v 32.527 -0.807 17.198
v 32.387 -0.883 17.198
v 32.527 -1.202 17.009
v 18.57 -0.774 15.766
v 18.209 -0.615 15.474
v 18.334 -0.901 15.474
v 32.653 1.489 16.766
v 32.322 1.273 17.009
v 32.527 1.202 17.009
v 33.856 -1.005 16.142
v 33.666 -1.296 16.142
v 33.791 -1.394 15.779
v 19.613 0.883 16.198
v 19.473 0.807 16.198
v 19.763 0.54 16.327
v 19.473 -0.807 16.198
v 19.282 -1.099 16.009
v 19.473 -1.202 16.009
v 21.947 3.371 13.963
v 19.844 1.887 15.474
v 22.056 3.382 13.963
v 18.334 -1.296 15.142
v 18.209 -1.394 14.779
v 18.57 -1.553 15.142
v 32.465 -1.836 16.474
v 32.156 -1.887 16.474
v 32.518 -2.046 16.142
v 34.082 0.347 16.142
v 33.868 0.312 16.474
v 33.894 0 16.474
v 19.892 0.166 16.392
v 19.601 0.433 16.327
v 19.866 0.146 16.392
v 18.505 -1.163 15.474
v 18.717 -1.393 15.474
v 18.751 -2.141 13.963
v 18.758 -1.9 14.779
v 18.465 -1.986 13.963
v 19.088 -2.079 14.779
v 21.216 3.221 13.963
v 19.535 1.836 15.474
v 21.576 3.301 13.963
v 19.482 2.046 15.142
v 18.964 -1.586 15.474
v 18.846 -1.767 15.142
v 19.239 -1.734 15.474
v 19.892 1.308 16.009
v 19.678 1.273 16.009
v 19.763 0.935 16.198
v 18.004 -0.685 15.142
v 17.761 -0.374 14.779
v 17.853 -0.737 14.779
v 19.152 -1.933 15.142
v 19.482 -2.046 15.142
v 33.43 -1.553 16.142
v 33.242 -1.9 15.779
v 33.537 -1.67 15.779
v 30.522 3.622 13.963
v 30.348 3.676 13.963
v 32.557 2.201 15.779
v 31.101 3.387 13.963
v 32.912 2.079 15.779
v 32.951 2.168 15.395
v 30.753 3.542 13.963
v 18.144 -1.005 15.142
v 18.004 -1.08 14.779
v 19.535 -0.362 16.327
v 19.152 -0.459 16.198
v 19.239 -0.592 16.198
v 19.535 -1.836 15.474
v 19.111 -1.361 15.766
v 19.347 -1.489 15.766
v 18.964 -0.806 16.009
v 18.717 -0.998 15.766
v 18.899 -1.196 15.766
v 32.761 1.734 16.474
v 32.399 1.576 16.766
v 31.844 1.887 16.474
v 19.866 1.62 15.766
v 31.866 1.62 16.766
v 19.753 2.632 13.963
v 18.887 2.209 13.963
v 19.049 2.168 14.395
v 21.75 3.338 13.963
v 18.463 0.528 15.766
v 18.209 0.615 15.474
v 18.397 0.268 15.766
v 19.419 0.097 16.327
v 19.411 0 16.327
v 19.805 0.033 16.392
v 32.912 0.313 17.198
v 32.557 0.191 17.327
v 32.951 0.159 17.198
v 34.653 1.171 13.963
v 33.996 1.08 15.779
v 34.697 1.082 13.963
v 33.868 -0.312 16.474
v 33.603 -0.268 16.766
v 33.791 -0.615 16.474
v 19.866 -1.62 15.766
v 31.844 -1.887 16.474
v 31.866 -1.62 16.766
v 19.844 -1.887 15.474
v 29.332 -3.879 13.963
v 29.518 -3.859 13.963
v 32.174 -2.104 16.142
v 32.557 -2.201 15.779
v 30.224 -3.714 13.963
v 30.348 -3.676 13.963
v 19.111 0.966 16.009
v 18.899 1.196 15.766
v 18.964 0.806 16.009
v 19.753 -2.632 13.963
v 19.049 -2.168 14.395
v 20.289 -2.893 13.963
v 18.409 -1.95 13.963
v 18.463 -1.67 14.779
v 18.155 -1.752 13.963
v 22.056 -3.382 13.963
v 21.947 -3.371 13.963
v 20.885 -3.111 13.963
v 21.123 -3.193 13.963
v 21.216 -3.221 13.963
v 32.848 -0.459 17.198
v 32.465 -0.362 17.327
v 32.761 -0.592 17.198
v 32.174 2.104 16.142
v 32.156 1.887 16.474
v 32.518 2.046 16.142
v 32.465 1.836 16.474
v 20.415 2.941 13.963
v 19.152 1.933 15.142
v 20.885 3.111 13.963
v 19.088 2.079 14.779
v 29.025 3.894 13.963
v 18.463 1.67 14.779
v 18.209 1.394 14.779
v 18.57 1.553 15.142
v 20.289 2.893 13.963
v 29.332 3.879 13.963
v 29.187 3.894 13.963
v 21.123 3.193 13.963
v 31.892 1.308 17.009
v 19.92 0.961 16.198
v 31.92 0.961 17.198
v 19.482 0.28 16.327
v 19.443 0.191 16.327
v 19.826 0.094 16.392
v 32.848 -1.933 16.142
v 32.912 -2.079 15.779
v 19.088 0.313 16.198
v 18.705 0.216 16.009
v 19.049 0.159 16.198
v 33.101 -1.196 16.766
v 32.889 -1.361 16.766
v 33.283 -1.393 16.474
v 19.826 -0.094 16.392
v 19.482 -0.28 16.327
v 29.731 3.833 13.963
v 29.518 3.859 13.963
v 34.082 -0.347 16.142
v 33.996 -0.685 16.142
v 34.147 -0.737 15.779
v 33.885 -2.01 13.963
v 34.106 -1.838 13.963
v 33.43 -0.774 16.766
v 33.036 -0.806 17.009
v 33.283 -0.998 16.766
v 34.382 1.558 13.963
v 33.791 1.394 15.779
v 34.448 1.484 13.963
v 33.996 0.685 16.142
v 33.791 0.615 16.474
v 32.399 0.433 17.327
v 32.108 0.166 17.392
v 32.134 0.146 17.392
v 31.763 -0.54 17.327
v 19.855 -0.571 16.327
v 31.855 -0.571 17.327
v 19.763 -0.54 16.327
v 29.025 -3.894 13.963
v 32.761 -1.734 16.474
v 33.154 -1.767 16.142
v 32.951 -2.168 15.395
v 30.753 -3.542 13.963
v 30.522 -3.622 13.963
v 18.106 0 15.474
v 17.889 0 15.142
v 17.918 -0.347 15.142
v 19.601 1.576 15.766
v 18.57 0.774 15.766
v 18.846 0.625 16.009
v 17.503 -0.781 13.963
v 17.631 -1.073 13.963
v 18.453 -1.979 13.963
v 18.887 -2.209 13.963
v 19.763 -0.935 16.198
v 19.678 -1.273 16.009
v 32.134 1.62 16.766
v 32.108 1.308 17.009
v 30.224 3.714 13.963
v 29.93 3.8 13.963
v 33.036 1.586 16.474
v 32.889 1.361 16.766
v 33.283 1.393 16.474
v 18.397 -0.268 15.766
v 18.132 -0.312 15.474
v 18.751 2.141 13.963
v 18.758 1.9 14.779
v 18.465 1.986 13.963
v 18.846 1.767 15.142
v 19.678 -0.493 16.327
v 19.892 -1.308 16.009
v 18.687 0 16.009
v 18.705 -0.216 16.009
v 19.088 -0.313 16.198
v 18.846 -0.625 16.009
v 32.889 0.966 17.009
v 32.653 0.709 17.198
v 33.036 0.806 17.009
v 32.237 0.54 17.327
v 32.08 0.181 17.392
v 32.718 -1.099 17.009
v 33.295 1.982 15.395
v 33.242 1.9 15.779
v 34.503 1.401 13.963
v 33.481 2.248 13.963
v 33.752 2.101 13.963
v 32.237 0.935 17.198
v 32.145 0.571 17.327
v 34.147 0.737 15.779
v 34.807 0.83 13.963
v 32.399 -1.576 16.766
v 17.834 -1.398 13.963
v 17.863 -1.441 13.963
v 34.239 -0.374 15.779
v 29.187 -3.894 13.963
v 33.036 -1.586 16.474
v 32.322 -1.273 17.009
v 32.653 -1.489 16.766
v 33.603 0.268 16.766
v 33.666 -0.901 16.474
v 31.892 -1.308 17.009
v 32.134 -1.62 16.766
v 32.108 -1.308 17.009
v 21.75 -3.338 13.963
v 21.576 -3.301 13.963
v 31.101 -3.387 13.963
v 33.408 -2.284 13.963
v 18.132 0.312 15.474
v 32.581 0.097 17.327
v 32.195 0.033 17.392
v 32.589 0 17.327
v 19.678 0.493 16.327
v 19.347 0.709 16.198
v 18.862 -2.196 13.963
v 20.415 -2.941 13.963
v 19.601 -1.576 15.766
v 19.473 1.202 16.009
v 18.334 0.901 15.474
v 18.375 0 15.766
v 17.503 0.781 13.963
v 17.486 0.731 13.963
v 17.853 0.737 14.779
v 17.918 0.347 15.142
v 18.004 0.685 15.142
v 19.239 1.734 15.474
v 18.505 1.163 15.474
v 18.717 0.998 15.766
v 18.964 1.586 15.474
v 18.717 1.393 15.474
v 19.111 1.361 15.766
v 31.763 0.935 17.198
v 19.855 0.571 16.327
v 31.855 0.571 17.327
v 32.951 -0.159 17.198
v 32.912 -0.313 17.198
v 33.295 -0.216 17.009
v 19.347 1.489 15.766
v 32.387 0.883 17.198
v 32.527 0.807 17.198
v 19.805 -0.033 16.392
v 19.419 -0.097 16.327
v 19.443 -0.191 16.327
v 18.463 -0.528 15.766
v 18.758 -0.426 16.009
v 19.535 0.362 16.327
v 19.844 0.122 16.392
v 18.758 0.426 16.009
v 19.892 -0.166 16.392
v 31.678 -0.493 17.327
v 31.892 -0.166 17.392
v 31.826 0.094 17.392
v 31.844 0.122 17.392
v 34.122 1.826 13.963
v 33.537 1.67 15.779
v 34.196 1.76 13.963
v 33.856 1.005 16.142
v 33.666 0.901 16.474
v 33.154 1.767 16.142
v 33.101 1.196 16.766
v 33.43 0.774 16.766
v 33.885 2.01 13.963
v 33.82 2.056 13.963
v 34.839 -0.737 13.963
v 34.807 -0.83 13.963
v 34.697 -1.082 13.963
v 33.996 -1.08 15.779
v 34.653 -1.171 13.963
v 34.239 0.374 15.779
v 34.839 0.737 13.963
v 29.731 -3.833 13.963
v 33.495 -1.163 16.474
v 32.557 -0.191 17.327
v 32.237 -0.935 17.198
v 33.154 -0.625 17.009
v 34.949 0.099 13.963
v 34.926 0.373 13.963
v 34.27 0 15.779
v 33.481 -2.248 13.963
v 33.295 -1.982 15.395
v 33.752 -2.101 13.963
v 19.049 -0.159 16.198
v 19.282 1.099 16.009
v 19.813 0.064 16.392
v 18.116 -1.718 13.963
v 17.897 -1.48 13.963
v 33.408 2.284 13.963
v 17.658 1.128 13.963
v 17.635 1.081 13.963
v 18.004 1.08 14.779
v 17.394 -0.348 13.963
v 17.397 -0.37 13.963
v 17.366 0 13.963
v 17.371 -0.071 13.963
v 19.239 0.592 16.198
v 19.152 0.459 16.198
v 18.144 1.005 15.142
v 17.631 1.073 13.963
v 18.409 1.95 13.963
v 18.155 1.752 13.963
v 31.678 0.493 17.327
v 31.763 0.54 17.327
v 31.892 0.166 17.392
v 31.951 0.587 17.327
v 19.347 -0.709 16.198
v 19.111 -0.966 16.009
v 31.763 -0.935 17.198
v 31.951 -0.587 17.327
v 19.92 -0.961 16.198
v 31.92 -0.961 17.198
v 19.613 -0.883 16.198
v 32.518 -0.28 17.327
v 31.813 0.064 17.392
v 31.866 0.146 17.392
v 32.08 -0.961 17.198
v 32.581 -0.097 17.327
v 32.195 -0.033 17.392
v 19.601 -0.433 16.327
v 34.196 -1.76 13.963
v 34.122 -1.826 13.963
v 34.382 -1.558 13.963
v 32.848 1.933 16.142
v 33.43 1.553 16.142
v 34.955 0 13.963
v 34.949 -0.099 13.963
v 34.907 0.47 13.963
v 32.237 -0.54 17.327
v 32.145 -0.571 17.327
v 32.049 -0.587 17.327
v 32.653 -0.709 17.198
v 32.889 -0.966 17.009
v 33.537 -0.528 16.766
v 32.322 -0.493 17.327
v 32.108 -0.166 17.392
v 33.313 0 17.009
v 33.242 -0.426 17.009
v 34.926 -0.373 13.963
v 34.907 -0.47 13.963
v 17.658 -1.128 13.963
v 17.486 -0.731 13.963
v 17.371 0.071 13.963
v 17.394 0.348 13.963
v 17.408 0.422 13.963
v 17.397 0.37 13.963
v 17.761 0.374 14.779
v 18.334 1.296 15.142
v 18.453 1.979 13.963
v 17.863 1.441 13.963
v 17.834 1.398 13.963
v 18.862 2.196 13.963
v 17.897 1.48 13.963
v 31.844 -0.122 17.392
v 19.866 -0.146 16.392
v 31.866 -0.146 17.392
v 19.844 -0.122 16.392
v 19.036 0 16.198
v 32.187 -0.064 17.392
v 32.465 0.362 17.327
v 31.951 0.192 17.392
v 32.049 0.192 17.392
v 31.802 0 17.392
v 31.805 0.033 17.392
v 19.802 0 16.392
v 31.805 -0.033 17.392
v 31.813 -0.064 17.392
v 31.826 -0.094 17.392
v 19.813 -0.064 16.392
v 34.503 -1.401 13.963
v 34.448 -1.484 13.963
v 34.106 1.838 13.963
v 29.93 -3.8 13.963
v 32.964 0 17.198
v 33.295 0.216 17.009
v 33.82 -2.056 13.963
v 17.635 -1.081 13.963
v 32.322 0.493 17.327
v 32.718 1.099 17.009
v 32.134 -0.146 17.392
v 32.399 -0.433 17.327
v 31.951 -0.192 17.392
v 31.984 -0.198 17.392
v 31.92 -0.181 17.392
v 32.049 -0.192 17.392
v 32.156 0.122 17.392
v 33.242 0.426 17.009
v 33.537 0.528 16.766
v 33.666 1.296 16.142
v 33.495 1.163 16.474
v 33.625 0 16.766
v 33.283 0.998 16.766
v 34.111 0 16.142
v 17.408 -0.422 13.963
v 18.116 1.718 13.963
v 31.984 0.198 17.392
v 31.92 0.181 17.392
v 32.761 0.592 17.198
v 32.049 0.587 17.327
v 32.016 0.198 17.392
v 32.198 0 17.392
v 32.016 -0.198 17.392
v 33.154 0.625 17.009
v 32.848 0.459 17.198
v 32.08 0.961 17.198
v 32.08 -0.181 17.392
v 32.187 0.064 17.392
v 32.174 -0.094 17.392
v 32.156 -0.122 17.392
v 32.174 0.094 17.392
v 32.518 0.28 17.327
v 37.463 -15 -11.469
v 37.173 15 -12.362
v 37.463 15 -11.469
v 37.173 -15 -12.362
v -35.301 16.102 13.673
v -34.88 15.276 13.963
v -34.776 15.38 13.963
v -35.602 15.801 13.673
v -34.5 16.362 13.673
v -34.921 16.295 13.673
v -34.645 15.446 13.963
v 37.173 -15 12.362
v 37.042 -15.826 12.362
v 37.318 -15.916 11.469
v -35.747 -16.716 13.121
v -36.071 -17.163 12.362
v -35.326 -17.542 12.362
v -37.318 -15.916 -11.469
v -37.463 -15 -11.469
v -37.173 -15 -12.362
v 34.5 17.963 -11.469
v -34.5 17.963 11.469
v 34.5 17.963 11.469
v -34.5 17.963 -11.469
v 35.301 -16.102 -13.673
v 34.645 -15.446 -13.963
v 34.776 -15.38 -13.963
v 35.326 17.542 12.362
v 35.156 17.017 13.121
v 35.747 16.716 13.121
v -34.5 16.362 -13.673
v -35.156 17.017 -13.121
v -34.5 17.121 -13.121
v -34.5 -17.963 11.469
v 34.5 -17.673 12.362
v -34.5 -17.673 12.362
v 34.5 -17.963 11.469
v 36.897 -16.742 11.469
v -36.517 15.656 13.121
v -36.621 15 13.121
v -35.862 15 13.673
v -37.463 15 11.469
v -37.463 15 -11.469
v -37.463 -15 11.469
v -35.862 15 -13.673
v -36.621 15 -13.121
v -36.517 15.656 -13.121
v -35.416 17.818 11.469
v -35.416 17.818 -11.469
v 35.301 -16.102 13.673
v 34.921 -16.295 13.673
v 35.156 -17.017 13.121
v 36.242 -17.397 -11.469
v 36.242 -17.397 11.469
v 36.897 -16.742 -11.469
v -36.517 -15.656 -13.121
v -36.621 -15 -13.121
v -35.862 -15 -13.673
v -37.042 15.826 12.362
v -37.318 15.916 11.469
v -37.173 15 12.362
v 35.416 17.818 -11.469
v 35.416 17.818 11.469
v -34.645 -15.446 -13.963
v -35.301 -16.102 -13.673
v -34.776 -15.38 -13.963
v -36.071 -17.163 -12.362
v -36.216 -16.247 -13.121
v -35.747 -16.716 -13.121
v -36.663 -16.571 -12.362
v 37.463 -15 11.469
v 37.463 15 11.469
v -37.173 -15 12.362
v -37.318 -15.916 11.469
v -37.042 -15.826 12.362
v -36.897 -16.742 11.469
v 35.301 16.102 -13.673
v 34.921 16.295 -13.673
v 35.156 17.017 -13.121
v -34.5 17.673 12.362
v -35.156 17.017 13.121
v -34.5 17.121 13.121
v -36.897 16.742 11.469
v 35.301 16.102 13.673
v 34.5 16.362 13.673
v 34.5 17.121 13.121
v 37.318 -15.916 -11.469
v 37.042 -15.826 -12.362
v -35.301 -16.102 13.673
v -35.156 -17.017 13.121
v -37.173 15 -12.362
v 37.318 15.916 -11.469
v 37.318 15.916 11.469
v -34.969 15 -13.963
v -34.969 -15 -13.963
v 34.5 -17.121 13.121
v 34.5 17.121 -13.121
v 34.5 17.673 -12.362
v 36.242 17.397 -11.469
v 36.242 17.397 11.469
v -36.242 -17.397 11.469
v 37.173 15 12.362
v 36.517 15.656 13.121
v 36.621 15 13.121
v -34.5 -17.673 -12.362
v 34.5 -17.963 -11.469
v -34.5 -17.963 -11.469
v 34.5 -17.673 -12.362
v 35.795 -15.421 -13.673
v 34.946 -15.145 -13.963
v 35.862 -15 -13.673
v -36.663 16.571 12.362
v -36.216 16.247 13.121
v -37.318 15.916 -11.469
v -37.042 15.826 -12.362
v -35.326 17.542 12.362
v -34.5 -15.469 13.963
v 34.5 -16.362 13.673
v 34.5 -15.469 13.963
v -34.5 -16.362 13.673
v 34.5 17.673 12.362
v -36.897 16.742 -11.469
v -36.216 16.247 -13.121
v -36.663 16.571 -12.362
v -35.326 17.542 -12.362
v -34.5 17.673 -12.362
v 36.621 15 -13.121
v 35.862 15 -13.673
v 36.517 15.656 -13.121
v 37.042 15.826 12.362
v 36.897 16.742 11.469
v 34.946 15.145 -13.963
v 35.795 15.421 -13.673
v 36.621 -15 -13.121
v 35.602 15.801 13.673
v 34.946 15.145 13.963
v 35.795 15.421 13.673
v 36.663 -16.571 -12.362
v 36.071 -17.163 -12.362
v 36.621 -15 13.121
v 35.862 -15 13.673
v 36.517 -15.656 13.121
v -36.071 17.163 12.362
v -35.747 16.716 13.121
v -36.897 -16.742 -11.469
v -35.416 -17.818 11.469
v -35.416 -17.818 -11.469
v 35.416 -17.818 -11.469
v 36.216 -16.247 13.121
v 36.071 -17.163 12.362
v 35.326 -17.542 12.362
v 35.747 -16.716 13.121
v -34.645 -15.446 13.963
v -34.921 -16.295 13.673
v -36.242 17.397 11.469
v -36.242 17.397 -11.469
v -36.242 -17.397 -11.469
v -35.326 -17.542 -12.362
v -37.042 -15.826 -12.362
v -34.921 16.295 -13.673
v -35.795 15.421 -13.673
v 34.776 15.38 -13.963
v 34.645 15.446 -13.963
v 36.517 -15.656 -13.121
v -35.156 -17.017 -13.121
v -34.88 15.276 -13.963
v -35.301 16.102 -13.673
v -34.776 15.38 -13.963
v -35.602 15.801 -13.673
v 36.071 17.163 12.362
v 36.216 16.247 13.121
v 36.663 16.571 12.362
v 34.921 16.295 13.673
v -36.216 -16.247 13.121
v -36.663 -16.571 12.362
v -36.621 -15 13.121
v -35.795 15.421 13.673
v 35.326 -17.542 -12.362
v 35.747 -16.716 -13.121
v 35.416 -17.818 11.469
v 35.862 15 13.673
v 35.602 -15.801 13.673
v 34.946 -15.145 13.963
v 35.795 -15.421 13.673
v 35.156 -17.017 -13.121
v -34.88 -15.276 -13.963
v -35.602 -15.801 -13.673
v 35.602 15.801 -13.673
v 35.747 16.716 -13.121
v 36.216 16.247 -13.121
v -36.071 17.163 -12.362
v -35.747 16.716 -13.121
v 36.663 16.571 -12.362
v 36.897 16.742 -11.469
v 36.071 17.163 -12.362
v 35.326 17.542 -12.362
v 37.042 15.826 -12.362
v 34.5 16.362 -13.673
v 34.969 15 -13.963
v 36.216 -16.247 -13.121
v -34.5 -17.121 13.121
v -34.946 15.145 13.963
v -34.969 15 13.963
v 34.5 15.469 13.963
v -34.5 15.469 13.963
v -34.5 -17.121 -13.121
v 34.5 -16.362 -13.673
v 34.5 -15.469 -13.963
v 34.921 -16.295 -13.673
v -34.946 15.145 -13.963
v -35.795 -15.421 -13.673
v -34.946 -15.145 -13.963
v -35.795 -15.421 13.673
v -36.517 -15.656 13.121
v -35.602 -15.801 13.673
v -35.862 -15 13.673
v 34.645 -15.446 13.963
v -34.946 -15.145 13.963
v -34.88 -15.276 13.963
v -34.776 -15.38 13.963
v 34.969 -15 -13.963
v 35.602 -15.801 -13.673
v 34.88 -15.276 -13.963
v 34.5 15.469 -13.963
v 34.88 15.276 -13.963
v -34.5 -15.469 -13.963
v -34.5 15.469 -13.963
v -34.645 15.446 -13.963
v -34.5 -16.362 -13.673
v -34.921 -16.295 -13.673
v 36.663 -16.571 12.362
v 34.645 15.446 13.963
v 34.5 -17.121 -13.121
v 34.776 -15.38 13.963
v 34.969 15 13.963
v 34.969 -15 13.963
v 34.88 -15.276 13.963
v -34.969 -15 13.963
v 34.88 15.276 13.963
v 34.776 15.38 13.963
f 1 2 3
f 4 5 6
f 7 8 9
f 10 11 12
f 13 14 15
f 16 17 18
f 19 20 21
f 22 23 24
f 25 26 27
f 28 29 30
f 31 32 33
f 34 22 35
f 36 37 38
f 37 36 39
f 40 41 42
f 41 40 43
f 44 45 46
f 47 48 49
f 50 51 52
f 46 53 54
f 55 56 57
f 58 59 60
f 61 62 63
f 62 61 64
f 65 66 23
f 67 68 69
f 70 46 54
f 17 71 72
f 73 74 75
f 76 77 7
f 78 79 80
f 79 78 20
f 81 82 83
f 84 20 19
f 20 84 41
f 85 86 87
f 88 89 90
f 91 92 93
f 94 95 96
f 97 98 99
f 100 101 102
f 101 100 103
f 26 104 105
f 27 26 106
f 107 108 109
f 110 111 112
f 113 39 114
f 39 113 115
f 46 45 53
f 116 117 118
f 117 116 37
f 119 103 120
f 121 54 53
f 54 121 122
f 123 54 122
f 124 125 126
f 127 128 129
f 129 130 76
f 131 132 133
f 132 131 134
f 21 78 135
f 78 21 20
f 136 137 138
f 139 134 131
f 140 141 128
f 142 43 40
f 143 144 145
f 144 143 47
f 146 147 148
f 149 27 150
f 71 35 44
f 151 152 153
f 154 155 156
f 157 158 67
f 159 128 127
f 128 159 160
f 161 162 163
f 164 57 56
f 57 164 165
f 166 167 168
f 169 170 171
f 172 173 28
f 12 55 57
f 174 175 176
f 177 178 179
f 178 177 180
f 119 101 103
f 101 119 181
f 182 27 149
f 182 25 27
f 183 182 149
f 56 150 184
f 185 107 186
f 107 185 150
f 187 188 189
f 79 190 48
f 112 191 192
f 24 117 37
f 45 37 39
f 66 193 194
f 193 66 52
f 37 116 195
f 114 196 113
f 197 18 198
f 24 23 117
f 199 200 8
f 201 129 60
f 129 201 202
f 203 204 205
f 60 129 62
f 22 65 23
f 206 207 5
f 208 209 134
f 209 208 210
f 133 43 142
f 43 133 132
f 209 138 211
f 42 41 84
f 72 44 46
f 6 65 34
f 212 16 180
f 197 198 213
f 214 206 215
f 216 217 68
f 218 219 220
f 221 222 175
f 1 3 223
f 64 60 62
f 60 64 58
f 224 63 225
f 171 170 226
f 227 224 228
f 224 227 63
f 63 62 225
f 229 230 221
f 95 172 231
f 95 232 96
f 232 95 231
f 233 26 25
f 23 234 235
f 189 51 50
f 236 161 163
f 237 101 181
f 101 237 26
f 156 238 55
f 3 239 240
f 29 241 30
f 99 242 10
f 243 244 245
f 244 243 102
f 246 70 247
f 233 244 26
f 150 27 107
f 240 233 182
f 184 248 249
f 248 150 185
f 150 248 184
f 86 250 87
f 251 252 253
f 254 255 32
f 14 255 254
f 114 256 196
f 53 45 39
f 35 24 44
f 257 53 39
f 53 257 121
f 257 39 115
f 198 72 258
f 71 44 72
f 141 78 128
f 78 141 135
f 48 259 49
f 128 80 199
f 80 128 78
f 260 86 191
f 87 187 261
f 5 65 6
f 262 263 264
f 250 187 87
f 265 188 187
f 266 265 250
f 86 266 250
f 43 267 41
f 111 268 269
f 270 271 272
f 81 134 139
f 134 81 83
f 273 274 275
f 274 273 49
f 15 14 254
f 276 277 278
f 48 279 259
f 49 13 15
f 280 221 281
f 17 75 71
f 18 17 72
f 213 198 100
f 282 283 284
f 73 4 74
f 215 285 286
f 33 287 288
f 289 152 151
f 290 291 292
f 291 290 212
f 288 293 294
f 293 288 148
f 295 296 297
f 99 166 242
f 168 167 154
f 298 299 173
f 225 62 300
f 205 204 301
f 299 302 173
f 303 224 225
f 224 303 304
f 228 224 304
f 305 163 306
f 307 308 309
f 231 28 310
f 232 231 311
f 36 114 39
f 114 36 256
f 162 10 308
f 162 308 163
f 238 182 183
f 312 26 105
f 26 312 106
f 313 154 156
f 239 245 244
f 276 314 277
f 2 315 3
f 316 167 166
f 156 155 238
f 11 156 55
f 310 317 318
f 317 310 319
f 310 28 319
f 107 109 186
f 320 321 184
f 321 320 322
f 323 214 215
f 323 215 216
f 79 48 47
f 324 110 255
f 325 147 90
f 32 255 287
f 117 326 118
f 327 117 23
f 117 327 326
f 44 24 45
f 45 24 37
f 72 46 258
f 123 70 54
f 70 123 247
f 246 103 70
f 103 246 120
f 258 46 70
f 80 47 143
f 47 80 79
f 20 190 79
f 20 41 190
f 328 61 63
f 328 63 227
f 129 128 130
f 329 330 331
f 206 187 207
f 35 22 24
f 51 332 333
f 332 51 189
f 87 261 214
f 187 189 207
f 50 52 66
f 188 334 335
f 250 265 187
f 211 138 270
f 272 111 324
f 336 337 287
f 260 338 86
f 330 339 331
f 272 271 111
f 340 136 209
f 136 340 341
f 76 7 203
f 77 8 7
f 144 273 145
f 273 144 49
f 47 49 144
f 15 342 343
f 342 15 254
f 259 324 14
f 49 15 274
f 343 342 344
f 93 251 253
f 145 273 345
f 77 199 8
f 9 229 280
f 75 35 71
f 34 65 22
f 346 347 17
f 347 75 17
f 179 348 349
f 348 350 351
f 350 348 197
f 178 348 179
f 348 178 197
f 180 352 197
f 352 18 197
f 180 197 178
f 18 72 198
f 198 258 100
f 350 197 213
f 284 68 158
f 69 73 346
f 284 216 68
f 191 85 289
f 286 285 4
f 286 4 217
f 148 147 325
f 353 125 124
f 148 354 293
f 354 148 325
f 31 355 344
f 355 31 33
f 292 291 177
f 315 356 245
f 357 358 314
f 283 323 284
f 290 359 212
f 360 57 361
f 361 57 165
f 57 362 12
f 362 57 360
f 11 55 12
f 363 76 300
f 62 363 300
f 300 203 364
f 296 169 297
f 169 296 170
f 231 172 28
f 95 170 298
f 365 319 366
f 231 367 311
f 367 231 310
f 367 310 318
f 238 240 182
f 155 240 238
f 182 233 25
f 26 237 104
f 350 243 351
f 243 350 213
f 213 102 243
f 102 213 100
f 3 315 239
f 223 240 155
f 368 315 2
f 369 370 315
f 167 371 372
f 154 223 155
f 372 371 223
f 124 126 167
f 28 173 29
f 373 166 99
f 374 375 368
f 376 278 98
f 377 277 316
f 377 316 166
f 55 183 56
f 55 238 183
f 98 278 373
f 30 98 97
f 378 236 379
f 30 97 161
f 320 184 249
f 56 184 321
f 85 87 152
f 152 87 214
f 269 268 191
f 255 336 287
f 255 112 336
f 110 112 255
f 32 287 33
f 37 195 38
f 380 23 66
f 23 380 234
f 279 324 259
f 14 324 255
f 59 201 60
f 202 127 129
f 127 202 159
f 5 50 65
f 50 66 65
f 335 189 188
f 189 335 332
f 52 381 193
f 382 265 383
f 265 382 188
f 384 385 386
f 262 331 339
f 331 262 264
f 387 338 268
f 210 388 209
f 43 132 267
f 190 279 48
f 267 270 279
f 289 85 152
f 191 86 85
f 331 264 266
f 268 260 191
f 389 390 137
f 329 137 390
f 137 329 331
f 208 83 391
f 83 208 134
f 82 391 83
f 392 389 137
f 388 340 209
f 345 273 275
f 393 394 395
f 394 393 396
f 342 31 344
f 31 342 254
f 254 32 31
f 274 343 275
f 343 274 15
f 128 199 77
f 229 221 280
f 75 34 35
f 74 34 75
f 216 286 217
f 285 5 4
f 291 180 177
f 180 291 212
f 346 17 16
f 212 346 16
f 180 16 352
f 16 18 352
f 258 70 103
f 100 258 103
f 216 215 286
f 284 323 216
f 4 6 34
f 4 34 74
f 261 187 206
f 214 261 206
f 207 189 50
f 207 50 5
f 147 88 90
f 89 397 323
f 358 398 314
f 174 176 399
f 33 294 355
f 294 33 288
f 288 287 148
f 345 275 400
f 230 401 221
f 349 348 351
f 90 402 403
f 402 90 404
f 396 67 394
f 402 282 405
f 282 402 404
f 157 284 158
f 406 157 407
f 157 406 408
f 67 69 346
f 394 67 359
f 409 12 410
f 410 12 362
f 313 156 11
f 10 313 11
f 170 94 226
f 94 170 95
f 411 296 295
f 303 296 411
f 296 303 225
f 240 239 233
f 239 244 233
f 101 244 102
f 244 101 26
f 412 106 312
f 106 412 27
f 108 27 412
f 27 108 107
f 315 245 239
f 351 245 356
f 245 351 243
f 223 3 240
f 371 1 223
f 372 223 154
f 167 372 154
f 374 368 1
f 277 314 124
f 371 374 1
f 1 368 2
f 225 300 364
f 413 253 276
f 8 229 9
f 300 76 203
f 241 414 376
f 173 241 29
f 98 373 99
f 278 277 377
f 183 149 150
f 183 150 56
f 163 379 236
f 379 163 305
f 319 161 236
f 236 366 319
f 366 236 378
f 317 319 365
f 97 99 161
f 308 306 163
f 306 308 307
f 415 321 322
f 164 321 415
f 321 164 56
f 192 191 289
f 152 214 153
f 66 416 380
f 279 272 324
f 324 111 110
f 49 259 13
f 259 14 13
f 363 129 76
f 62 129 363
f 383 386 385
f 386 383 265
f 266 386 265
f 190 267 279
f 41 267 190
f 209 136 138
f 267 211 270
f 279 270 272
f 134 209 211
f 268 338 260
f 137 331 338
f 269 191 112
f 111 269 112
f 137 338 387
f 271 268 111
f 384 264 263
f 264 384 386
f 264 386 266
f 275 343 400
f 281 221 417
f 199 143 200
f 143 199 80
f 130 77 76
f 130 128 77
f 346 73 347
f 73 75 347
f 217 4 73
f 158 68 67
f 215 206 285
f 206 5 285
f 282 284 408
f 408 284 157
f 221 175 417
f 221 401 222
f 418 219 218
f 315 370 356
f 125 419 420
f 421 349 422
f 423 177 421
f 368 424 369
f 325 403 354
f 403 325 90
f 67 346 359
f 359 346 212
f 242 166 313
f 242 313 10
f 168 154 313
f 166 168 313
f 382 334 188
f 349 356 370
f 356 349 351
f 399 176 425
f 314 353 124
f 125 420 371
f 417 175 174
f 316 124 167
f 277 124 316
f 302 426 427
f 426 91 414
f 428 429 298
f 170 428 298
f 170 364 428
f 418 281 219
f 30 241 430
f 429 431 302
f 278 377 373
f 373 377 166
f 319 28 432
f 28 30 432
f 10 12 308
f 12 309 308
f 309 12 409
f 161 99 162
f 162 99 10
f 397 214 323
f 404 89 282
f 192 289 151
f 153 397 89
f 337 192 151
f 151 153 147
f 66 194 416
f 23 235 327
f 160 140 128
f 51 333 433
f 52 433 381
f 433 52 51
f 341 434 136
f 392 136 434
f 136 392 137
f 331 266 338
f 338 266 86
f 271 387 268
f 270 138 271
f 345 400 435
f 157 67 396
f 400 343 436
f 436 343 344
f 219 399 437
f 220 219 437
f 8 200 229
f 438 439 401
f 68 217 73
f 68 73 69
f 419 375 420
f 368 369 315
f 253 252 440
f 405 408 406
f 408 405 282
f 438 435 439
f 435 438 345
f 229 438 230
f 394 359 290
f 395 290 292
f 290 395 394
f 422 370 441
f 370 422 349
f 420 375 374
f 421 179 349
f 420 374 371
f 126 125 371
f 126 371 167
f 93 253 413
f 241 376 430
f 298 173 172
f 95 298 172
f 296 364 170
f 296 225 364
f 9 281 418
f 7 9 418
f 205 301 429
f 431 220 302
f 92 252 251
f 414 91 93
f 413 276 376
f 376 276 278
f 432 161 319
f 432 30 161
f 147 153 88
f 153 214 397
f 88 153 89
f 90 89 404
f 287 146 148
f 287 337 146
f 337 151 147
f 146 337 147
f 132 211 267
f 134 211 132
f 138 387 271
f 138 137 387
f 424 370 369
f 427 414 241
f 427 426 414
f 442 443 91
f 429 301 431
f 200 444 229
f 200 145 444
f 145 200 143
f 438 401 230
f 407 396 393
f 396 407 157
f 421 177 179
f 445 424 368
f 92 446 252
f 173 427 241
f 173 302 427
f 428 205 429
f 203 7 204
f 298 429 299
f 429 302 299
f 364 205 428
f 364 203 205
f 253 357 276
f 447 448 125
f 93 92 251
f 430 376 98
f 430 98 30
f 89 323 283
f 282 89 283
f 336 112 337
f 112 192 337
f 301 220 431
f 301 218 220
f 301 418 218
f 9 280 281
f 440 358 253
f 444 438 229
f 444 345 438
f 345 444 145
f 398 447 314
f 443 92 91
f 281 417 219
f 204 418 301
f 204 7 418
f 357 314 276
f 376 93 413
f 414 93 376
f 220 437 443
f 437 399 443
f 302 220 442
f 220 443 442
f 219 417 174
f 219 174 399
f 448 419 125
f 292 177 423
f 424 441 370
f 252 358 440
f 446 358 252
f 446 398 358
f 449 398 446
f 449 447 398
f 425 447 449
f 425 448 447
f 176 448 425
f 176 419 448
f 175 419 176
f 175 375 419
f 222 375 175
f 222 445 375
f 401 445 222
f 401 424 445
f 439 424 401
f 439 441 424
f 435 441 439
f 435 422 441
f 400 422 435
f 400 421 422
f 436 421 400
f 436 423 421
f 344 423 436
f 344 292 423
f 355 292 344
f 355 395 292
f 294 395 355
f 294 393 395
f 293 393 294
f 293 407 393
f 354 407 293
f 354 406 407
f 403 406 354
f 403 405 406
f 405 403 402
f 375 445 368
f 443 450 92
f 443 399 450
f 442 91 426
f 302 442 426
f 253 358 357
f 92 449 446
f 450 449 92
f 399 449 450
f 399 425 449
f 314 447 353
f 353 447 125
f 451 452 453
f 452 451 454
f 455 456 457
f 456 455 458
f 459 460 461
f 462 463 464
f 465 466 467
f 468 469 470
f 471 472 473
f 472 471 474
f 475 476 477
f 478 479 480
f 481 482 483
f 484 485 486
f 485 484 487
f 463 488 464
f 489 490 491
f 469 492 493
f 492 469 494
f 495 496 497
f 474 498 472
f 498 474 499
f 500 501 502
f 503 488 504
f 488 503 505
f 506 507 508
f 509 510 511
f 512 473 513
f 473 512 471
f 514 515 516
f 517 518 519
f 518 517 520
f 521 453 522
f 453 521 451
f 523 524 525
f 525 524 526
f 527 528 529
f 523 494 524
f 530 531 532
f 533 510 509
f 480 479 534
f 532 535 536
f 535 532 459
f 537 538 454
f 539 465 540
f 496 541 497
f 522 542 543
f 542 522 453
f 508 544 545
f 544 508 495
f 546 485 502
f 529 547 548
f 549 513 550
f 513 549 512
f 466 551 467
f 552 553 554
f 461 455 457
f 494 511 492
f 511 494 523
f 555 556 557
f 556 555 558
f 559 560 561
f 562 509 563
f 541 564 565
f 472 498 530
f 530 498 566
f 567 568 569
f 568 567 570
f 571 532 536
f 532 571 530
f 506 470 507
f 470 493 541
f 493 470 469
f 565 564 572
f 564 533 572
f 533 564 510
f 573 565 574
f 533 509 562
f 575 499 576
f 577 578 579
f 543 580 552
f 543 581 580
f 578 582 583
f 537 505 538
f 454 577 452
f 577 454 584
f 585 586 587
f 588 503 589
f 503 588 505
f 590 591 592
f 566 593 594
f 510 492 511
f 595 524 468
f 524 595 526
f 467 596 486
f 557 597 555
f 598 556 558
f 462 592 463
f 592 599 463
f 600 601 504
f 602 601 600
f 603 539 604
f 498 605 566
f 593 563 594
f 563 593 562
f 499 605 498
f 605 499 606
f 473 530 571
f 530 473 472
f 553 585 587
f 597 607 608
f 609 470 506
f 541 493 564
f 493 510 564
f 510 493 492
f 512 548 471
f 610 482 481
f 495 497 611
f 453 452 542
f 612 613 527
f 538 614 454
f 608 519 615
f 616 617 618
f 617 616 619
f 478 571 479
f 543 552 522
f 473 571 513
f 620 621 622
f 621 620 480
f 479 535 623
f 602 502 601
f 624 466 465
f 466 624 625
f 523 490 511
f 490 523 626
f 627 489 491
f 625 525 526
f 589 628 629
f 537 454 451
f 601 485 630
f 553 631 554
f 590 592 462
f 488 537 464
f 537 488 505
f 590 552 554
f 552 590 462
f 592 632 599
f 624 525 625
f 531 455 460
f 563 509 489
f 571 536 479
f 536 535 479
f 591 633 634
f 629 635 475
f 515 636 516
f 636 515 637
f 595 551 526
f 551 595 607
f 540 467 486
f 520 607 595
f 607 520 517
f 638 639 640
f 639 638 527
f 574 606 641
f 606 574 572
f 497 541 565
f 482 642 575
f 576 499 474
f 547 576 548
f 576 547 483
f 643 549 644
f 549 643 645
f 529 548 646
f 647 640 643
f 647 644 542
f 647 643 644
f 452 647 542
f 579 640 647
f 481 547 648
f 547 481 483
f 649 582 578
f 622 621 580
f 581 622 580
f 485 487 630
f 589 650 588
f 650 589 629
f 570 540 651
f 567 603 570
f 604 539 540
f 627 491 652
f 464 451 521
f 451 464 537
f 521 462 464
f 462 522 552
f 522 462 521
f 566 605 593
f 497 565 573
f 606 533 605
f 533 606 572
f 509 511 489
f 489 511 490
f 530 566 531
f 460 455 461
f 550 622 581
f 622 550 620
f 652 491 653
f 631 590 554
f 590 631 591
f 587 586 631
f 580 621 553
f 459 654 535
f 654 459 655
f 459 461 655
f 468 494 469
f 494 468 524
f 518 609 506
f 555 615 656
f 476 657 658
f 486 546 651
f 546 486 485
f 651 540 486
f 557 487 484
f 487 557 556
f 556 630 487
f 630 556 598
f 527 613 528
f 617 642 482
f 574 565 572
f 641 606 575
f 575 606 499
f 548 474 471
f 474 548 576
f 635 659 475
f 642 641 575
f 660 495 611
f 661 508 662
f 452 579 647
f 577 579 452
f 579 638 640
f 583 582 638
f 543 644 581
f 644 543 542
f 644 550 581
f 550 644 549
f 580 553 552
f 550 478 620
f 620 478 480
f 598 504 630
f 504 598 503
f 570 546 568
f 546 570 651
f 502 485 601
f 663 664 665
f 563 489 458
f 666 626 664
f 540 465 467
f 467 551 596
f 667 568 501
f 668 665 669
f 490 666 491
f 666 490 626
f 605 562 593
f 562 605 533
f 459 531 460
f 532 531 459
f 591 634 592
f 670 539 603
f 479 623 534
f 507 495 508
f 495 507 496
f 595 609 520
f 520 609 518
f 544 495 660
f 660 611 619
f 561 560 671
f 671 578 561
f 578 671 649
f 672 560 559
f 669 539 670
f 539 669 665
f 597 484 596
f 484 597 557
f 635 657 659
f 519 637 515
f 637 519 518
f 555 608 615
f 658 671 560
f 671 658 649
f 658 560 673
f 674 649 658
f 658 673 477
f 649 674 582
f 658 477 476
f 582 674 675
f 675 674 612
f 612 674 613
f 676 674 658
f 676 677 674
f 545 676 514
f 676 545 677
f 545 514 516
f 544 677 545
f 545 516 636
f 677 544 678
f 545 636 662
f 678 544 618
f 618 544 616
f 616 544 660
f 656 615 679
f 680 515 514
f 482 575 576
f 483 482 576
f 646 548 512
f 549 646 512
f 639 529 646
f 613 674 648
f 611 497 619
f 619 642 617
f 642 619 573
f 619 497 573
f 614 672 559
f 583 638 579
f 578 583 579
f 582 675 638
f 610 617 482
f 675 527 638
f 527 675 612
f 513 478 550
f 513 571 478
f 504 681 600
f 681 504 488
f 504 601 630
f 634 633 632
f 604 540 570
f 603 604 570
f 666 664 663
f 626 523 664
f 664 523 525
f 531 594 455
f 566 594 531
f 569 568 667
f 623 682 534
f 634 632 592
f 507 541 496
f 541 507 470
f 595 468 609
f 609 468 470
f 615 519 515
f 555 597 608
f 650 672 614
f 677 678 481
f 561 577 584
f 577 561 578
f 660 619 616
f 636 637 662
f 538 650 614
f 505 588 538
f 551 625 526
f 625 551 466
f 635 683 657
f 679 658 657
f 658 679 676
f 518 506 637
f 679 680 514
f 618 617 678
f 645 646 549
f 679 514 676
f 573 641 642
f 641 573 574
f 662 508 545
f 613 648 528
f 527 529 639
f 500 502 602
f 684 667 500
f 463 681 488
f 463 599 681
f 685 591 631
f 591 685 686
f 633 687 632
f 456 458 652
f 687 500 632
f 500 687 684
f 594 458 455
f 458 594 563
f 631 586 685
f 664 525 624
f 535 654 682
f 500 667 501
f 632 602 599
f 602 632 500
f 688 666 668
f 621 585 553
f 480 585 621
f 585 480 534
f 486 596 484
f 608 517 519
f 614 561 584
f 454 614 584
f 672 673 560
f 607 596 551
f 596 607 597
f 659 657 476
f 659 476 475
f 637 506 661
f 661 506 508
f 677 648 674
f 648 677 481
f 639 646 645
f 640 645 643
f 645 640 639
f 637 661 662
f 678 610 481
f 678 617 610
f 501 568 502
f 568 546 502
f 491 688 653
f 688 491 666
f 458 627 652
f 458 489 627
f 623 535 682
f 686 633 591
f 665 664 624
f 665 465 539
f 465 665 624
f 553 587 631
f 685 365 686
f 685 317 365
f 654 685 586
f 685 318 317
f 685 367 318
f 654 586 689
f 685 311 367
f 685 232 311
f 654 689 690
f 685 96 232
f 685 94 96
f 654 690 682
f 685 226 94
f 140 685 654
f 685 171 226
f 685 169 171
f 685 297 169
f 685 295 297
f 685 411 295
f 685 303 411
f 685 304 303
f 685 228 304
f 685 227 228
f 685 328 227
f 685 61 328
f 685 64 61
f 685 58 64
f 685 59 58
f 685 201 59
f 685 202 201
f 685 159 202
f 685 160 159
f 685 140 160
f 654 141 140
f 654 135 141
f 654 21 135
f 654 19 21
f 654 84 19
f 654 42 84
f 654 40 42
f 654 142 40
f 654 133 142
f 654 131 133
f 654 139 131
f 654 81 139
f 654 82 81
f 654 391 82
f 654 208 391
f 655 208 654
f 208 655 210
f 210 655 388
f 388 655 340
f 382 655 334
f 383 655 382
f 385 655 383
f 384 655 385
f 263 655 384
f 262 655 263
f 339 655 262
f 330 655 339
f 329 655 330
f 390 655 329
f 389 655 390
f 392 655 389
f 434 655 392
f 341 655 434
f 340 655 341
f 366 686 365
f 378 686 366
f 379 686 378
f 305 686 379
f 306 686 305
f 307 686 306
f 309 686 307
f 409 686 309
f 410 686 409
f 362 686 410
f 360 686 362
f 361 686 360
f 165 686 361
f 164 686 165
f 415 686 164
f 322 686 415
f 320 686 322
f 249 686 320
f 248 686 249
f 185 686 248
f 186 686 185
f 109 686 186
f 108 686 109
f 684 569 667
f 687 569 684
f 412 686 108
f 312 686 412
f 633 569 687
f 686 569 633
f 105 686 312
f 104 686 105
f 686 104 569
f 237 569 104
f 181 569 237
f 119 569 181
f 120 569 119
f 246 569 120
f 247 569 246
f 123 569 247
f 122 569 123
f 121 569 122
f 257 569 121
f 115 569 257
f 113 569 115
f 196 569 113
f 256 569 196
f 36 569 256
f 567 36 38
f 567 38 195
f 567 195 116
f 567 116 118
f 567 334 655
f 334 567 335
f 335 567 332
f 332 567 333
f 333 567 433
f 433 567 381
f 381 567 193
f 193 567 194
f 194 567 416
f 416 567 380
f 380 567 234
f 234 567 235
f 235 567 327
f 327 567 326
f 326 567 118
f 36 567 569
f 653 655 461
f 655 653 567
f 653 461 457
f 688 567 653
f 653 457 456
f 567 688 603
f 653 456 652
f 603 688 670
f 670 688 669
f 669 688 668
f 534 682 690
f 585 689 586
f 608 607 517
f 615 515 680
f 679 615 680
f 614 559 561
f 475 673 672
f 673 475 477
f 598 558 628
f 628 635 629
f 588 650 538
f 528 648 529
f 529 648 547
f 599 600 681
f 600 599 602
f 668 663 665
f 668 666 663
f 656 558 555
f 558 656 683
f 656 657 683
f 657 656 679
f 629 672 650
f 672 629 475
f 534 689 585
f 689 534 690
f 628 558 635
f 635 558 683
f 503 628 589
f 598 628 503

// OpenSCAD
// file: ../parts/battery_latch.scad
$fa = 2;
$fs = 0.4;

module battery_latch() {
  color("#3a3a44")
    difference() {
      hull() {
        translate([0, 0, 0]) sphere(r = 3);
        translate([16, 0, 0]) sphere(r = 3);
        translate([14, 0, 7]) sphere(r = 2.4);
        translate([2, 0, 6]) sphere(r = 2.4);
        translate([8, 4.5, 2]) sphere(r = 2);
        translate([8, -4.5, 2]) sphere(r = 2);
      }
      translate([3, 0, 2])
        rotate([0, 90, 0])
          cylinder(h = 8, d = 3.3);
    }
}

battery_latch();
// file: ../parts/battery_pack.scad
$fa = 4;
$fs = 0.8;

module battery_pack() {
  color("#f0c400")
    minkowski() {
      cube([69, 30, 22], center = true);
      sphere(r = 3, $fn = 20);
    }
}

battery_pack();
// main file
use <../parts/battery_pack.scad>
use <../parts/battery_latch.scad>

$fa = 3;
$fs = 0.6;

module power_assy() {
  battery_pack();
  translate([18, 0, 8])
    battery_latch();
}

power_assy();
